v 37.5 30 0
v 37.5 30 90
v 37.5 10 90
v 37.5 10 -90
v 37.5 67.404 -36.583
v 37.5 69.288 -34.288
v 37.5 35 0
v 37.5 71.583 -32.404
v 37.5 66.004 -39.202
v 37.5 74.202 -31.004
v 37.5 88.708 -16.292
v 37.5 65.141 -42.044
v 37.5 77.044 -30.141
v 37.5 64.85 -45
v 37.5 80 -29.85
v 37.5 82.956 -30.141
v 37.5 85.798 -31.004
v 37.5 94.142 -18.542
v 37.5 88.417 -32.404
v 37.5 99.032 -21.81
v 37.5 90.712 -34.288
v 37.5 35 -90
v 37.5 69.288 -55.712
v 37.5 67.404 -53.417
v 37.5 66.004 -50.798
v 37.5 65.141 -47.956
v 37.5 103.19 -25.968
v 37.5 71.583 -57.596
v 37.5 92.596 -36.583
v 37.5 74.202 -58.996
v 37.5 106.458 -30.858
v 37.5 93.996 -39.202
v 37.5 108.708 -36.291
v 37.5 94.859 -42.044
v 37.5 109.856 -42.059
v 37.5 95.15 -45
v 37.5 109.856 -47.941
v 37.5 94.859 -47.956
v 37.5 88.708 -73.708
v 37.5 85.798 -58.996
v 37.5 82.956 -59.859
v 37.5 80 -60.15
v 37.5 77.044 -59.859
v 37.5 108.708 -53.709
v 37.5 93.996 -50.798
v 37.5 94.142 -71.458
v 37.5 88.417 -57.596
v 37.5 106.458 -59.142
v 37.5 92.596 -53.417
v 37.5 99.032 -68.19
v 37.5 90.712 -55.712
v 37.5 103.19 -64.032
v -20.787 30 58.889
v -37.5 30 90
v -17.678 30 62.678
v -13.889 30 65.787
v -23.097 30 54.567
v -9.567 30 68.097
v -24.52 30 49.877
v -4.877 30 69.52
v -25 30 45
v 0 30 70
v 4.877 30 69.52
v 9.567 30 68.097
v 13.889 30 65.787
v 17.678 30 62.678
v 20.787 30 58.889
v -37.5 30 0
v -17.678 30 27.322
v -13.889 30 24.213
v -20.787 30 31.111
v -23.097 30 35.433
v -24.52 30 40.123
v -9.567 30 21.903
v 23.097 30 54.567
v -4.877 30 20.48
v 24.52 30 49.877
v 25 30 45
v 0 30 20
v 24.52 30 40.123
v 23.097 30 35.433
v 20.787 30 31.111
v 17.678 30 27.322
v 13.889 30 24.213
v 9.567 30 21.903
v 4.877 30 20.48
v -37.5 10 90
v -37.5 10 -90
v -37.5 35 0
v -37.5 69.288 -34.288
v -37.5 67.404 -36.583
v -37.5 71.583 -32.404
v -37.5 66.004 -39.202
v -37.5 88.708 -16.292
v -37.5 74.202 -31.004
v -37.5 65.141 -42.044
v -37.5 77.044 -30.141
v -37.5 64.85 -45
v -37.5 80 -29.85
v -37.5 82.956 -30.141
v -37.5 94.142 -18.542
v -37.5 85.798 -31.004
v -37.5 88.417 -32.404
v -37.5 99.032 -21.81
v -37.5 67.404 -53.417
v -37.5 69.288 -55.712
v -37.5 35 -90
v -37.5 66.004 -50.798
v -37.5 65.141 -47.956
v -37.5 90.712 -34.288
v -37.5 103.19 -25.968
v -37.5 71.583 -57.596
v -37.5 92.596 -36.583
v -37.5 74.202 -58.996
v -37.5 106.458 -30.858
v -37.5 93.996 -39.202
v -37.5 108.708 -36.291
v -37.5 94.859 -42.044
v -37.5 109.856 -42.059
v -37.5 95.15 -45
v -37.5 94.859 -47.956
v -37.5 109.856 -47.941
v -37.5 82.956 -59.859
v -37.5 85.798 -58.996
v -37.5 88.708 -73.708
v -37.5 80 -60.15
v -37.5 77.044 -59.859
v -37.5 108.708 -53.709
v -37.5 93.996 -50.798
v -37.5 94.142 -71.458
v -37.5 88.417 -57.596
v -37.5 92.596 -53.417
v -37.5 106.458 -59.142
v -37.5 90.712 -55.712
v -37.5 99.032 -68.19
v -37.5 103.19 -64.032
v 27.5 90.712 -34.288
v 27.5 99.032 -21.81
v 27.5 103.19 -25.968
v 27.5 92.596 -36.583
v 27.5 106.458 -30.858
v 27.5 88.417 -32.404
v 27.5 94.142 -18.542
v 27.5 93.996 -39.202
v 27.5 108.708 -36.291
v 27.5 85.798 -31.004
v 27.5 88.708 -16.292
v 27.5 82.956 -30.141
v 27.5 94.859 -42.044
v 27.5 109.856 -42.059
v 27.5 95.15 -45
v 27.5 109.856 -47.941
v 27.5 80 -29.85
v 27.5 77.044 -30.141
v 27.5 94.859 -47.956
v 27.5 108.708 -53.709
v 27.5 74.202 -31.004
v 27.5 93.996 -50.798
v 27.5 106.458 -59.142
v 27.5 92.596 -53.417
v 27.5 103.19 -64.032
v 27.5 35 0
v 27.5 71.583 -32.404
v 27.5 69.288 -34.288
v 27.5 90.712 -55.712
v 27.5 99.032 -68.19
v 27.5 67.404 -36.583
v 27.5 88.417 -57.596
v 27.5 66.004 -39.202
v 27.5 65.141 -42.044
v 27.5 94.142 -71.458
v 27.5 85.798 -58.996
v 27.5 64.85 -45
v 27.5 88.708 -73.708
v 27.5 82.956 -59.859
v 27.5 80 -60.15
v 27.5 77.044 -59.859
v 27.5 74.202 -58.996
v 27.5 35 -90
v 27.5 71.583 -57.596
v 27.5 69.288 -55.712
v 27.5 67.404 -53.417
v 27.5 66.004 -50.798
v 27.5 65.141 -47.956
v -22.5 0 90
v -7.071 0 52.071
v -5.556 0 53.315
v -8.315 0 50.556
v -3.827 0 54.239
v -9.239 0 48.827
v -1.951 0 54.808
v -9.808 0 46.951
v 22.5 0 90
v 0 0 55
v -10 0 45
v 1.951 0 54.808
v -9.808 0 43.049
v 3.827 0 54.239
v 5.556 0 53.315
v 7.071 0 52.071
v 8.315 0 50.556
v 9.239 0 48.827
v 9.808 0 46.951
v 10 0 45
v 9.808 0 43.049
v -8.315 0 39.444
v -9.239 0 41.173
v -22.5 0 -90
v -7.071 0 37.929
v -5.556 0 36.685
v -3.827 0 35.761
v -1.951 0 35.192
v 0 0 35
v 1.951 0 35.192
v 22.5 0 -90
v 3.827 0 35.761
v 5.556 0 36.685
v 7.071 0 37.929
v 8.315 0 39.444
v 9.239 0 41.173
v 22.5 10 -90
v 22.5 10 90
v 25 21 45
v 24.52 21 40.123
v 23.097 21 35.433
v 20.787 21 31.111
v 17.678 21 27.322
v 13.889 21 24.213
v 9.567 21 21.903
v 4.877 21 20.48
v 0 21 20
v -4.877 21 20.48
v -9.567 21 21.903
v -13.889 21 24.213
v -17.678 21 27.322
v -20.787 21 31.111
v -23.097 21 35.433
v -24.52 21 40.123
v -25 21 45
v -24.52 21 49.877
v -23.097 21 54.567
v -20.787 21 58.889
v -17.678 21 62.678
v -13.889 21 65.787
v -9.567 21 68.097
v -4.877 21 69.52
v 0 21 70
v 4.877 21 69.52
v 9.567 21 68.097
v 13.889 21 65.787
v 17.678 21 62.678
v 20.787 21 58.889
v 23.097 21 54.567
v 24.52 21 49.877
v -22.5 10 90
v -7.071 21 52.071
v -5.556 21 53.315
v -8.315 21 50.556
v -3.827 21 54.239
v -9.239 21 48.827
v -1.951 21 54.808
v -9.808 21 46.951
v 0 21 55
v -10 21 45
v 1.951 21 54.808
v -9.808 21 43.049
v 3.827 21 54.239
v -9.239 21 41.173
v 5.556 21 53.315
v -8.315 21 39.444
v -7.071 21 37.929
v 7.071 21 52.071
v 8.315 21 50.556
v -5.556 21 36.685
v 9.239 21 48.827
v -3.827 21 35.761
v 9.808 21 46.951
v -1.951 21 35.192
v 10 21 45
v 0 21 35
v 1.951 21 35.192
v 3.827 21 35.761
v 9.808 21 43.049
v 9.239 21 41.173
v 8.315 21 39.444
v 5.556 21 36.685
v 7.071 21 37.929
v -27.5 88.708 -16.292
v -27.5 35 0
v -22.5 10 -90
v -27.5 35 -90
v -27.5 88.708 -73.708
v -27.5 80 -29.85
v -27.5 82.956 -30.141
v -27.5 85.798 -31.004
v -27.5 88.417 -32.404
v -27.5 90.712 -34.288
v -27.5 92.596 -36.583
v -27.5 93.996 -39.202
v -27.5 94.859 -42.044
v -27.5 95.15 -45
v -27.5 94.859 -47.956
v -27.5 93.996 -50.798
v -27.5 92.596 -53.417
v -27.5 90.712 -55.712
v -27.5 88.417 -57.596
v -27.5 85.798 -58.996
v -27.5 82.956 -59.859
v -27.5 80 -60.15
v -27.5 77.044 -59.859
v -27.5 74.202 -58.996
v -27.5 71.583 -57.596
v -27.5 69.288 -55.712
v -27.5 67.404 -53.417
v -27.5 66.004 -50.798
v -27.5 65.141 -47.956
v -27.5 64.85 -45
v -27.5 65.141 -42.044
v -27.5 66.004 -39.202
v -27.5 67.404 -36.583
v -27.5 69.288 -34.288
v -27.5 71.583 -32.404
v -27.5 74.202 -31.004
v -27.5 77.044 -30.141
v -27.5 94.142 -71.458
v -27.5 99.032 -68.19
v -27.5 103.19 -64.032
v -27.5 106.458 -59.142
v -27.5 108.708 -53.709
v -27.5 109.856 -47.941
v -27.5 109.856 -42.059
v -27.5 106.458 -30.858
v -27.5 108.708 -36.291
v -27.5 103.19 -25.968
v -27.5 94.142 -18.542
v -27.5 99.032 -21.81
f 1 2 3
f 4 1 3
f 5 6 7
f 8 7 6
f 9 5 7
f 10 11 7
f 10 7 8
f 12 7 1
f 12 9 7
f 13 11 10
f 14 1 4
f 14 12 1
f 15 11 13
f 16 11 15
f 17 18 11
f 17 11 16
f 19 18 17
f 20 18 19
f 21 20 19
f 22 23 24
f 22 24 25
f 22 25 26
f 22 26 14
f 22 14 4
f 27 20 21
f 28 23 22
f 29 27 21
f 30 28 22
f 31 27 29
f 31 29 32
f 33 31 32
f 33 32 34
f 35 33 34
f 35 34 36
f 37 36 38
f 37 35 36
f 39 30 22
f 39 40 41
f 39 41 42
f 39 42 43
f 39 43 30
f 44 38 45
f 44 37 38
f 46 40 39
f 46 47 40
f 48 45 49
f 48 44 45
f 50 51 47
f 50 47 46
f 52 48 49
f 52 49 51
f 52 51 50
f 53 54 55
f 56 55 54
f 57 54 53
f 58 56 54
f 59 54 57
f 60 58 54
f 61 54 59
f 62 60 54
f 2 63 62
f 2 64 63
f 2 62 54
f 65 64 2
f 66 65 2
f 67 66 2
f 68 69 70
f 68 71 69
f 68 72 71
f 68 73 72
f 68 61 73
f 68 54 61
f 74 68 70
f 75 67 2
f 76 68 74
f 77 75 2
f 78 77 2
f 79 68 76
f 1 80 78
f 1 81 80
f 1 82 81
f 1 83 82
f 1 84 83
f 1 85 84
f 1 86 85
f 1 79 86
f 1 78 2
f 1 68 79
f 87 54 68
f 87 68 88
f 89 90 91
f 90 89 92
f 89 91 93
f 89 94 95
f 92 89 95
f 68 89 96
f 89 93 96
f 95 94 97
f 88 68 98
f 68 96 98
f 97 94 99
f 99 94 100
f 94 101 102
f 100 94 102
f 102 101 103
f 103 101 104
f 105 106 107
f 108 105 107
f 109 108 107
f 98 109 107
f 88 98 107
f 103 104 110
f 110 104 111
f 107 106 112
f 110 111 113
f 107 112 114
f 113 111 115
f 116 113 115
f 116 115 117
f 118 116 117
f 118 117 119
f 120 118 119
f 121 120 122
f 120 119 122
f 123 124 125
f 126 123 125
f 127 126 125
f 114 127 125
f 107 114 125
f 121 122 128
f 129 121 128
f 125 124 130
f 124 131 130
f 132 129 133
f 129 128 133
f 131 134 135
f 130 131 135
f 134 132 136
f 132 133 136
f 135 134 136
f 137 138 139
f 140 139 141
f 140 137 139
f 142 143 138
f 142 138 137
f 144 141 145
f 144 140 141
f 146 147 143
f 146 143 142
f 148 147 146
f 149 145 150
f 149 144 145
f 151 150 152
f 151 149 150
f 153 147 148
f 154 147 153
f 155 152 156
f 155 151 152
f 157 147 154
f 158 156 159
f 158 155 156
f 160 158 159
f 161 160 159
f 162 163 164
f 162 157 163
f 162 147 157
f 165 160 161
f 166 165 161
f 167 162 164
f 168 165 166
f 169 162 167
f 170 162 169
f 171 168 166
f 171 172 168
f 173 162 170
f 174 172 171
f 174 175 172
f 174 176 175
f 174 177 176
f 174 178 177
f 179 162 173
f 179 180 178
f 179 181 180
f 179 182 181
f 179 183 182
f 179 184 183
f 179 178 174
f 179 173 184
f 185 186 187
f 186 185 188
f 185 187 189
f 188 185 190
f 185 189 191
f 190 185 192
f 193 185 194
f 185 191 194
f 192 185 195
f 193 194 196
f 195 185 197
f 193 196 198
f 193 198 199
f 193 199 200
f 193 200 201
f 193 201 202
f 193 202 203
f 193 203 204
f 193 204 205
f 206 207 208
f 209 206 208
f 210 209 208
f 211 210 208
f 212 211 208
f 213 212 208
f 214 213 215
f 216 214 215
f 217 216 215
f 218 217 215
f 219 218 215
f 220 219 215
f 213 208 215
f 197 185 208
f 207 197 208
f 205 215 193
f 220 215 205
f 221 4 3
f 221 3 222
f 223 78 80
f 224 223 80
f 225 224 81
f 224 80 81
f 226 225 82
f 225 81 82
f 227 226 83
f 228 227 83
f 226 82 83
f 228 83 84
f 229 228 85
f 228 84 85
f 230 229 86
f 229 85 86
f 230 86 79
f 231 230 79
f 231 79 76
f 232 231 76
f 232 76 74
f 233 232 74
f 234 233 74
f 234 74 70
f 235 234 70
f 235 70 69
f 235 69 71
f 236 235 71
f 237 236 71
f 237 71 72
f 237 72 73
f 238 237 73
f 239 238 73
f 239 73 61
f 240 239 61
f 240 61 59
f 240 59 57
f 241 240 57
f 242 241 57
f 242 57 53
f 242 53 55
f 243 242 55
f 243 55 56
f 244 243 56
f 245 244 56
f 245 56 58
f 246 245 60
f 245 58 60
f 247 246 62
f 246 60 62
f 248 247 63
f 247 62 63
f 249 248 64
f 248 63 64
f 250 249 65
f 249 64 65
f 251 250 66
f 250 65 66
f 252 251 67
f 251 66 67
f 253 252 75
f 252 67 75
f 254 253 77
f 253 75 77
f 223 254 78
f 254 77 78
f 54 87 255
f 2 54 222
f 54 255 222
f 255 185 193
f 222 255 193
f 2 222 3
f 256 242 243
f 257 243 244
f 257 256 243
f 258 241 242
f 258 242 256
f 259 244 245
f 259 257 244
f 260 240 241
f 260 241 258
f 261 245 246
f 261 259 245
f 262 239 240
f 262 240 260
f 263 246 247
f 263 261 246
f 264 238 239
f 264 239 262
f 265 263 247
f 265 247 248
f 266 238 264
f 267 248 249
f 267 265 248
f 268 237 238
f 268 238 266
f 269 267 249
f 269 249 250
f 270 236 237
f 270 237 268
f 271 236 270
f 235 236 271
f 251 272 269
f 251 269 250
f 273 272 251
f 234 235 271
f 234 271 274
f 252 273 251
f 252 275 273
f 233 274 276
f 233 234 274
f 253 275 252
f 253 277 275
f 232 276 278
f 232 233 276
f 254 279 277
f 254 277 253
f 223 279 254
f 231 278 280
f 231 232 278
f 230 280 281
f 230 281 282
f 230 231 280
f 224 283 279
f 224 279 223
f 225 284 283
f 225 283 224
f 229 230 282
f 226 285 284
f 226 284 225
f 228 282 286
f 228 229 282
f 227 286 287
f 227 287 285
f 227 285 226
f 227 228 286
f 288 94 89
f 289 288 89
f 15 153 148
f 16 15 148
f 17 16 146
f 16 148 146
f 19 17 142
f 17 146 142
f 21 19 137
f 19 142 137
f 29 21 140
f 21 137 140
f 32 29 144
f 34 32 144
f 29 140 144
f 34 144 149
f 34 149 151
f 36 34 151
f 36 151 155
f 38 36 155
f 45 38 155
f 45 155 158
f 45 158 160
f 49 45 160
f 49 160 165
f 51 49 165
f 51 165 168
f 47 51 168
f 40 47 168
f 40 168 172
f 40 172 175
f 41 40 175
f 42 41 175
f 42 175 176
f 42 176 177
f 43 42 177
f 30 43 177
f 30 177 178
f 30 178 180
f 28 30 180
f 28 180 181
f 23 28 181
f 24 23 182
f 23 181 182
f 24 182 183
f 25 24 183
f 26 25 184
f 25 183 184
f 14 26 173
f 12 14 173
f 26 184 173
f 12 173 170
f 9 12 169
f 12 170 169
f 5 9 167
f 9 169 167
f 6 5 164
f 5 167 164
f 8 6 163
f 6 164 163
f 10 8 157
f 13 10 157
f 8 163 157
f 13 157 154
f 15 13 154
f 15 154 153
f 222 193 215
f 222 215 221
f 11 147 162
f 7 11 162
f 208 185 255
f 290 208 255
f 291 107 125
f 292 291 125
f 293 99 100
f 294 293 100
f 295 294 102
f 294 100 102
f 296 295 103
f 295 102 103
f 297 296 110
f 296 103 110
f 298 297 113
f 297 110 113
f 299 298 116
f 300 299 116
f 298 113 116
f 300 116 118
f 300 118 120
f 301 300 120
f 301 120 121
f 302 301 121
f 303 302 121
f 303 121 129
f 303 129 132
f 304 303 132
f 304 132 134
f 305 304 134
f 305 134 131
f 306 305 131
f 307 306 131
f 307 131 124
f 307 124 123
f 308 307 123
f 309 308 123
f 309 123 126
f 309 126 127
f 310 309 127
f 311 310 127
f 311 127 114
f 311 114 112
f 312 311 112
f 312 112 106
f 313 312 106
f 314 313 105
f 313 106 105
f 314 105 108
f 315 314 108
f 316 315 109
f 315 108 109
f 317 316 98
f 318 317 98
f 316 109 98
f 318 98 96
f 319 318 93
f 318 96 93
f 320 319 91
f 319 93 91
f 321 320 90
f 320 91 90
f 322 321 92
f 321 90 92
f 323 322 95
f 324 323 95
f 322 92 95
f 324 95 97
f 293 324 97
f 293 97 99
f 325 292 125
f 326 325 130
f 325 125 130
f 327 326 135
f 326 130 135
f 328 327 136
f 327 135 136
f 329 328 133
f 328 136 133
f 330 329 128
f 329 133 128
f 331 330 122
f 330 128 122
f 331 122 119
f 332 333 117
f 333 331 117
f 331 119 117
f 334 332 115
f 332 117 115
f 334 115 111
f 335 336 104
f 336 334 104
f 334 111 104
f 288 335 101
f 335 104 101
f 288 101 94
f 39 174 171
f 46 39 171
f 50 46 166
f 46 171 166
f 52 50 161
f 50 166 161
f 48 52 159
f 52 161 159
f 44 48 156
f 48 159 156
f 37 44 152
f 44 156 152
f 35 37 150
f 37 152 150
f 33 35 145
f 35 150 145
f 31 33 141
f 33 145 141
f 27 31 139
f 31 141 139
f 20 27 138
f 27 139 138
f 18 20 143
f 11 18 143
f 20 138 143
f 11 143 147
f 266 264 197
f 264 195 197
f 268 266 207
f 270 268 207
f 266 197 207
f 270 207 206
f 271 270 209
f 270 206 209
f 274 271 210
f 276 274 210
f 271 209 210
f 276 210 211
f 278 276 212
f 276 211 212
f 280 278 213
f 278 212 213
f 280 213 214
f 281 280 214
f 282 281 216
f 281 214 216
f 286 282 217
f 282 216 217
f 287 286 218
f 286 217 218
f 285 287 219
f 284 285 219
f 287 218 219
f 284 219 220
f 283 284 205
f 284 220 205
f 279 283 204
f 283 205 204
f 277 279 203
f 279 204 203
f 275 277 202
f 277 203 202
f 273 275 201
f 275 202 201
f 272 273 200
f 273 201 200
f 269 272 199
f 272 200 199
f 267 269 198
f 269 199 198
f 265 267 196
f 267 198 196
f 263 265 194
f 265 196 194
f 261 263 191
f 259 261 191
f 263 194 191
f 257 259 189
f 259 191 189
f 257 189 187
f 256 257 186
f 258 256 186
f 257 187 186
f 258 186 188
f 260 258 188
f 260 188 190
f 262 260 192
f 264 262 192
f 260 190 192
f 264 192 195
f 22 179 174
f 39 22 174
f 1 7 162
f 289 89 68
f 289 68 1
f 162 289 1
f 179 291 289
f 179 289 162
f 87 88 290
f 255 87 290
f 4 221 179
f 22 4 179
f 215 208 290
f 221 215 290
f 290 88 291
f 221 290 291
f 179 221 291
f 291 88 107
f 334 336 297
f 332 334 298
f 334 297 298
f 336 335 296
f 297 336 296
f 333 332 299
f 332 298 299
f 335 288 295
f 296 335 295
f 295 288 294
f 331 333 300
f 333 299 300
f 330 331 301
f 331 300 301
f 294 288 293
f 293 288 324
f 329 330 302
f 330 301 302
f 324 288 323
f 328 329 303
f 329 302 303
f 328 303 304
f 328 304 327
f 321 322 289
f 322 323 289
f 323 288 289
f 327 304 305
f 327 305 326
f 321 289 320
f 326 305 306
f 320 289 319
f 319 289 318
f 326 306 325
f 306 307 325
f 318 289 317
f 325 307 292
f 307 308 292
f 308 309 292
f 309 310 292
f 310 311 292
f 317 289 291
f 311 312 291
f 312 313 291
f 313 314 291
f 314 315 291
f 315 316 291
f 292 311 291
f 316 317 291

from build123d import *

# Parameters (mm, degrees)
SKETCH1_W           = 75
SKETCH1_H           = 180
BOSS_EXTRUDE1_DEPTH = 30
SKETCH2_W           = 15
SKETCH2_H           = 10
CUT_EXTRUDE1_DEPTH  = 187.296135226
SKETCH3_R           = 15.149621256
BOSS_EXTRUDE2_DEPTH = 75
CUT_EXTRUDE2_START  = 5
SKETCH4_W           = 55
SKETCH4_H           = 90
CUT_EXTRUDE2_DEPTH  = 122.119982556
HOLE1_D             = 20
HOLE1_CBORE_D       = 50
HOLE1_CBORE_DEPTH   = 9


with BuildPart() as part:
    # Sketch1 → Boss-Extrude1 (new body)
    with BuildSketch(Plane(origin=(0, 0, 0), x_dir=(1, 0, 0), z_dir=(0, 1, 0))):
        Rectangle(SKETCH1_W, SKETCH1_H)
    extrude(amount=BOSS_EXTRUDE1_DEPTH)

    # Sketch2 → Cut-Extrude1 (cut, through all)
    with BuildSketch(Plane.XY.offset(90)):
        with Locations((-30, 5)):
            Rectangle(SKETCH2_W, SKETCH2_H)
    cut_extrude1 = extrude(amount=-CUT_EXTRUDE1_DEPTH, mode=Mode.SUBTRACT)

    # Mirror1: Cut-Extrude1 across plane
    add(cut_extrude1.mirror(Plane(origin=(0, 0, 0), x_dir=(0, 0, 1), z_dir=(1, 0, 0))), mode=Mode.SUBTRACT)

    # Sketch3 → Boss-Extrude2 (add)
    with BuildSketch(Plane.ZY.offset(37.5)):
        with BuildLine():
            Line((-90, 30), (-90, 35))
            Line((-90, 35), (-73.708286934, 88.708286934))
            ThreePointArc((-73.708286934, 88.708286934), (-45, 110), (-16.291713066, 88.708286934))
            Line((-16.291713066, 88.708286934), (0, 35))
            Line((0, 35), (0, 30))
            Line((0, 30), (-90, 30))
        make_face()
        with Locations((-45, 80)):
            Circle(SKETCH3_R, mode=Mode.SUBTRACT)
    extrude(amount=-BOSS_EXTRUDE2_DEPTH)

    # Sketch4 → Cut-Extrude2 (cut, through all)
    with BuildSketch(Plane(origin=(0, 30, 0), x_dir=(1, 0, 0), z_dir=(0, 1, 0)).offset(CUT_EXTRUDE2_START)):
        with Locations((0, 45)):
            Rectangle(SKETCH4_W, SKETCH4_H)
    extrude(amount=CUT_EXTRUDE2_DEPTH, mode=Mode.SUBTRACT)

    # Hole1 (through all)
    with Locations(Plane(origin=(0, 30, 0), x_dir=(1, 0, 0), z_dir=(0, 1, 0))):
        with Locations((0, -45)):
            CounterBoreHole(HOLE1_D / 2, HOLE1_CBORE_D / 2, HOLE1_CBORE_DEPTH)


solid = part.part
